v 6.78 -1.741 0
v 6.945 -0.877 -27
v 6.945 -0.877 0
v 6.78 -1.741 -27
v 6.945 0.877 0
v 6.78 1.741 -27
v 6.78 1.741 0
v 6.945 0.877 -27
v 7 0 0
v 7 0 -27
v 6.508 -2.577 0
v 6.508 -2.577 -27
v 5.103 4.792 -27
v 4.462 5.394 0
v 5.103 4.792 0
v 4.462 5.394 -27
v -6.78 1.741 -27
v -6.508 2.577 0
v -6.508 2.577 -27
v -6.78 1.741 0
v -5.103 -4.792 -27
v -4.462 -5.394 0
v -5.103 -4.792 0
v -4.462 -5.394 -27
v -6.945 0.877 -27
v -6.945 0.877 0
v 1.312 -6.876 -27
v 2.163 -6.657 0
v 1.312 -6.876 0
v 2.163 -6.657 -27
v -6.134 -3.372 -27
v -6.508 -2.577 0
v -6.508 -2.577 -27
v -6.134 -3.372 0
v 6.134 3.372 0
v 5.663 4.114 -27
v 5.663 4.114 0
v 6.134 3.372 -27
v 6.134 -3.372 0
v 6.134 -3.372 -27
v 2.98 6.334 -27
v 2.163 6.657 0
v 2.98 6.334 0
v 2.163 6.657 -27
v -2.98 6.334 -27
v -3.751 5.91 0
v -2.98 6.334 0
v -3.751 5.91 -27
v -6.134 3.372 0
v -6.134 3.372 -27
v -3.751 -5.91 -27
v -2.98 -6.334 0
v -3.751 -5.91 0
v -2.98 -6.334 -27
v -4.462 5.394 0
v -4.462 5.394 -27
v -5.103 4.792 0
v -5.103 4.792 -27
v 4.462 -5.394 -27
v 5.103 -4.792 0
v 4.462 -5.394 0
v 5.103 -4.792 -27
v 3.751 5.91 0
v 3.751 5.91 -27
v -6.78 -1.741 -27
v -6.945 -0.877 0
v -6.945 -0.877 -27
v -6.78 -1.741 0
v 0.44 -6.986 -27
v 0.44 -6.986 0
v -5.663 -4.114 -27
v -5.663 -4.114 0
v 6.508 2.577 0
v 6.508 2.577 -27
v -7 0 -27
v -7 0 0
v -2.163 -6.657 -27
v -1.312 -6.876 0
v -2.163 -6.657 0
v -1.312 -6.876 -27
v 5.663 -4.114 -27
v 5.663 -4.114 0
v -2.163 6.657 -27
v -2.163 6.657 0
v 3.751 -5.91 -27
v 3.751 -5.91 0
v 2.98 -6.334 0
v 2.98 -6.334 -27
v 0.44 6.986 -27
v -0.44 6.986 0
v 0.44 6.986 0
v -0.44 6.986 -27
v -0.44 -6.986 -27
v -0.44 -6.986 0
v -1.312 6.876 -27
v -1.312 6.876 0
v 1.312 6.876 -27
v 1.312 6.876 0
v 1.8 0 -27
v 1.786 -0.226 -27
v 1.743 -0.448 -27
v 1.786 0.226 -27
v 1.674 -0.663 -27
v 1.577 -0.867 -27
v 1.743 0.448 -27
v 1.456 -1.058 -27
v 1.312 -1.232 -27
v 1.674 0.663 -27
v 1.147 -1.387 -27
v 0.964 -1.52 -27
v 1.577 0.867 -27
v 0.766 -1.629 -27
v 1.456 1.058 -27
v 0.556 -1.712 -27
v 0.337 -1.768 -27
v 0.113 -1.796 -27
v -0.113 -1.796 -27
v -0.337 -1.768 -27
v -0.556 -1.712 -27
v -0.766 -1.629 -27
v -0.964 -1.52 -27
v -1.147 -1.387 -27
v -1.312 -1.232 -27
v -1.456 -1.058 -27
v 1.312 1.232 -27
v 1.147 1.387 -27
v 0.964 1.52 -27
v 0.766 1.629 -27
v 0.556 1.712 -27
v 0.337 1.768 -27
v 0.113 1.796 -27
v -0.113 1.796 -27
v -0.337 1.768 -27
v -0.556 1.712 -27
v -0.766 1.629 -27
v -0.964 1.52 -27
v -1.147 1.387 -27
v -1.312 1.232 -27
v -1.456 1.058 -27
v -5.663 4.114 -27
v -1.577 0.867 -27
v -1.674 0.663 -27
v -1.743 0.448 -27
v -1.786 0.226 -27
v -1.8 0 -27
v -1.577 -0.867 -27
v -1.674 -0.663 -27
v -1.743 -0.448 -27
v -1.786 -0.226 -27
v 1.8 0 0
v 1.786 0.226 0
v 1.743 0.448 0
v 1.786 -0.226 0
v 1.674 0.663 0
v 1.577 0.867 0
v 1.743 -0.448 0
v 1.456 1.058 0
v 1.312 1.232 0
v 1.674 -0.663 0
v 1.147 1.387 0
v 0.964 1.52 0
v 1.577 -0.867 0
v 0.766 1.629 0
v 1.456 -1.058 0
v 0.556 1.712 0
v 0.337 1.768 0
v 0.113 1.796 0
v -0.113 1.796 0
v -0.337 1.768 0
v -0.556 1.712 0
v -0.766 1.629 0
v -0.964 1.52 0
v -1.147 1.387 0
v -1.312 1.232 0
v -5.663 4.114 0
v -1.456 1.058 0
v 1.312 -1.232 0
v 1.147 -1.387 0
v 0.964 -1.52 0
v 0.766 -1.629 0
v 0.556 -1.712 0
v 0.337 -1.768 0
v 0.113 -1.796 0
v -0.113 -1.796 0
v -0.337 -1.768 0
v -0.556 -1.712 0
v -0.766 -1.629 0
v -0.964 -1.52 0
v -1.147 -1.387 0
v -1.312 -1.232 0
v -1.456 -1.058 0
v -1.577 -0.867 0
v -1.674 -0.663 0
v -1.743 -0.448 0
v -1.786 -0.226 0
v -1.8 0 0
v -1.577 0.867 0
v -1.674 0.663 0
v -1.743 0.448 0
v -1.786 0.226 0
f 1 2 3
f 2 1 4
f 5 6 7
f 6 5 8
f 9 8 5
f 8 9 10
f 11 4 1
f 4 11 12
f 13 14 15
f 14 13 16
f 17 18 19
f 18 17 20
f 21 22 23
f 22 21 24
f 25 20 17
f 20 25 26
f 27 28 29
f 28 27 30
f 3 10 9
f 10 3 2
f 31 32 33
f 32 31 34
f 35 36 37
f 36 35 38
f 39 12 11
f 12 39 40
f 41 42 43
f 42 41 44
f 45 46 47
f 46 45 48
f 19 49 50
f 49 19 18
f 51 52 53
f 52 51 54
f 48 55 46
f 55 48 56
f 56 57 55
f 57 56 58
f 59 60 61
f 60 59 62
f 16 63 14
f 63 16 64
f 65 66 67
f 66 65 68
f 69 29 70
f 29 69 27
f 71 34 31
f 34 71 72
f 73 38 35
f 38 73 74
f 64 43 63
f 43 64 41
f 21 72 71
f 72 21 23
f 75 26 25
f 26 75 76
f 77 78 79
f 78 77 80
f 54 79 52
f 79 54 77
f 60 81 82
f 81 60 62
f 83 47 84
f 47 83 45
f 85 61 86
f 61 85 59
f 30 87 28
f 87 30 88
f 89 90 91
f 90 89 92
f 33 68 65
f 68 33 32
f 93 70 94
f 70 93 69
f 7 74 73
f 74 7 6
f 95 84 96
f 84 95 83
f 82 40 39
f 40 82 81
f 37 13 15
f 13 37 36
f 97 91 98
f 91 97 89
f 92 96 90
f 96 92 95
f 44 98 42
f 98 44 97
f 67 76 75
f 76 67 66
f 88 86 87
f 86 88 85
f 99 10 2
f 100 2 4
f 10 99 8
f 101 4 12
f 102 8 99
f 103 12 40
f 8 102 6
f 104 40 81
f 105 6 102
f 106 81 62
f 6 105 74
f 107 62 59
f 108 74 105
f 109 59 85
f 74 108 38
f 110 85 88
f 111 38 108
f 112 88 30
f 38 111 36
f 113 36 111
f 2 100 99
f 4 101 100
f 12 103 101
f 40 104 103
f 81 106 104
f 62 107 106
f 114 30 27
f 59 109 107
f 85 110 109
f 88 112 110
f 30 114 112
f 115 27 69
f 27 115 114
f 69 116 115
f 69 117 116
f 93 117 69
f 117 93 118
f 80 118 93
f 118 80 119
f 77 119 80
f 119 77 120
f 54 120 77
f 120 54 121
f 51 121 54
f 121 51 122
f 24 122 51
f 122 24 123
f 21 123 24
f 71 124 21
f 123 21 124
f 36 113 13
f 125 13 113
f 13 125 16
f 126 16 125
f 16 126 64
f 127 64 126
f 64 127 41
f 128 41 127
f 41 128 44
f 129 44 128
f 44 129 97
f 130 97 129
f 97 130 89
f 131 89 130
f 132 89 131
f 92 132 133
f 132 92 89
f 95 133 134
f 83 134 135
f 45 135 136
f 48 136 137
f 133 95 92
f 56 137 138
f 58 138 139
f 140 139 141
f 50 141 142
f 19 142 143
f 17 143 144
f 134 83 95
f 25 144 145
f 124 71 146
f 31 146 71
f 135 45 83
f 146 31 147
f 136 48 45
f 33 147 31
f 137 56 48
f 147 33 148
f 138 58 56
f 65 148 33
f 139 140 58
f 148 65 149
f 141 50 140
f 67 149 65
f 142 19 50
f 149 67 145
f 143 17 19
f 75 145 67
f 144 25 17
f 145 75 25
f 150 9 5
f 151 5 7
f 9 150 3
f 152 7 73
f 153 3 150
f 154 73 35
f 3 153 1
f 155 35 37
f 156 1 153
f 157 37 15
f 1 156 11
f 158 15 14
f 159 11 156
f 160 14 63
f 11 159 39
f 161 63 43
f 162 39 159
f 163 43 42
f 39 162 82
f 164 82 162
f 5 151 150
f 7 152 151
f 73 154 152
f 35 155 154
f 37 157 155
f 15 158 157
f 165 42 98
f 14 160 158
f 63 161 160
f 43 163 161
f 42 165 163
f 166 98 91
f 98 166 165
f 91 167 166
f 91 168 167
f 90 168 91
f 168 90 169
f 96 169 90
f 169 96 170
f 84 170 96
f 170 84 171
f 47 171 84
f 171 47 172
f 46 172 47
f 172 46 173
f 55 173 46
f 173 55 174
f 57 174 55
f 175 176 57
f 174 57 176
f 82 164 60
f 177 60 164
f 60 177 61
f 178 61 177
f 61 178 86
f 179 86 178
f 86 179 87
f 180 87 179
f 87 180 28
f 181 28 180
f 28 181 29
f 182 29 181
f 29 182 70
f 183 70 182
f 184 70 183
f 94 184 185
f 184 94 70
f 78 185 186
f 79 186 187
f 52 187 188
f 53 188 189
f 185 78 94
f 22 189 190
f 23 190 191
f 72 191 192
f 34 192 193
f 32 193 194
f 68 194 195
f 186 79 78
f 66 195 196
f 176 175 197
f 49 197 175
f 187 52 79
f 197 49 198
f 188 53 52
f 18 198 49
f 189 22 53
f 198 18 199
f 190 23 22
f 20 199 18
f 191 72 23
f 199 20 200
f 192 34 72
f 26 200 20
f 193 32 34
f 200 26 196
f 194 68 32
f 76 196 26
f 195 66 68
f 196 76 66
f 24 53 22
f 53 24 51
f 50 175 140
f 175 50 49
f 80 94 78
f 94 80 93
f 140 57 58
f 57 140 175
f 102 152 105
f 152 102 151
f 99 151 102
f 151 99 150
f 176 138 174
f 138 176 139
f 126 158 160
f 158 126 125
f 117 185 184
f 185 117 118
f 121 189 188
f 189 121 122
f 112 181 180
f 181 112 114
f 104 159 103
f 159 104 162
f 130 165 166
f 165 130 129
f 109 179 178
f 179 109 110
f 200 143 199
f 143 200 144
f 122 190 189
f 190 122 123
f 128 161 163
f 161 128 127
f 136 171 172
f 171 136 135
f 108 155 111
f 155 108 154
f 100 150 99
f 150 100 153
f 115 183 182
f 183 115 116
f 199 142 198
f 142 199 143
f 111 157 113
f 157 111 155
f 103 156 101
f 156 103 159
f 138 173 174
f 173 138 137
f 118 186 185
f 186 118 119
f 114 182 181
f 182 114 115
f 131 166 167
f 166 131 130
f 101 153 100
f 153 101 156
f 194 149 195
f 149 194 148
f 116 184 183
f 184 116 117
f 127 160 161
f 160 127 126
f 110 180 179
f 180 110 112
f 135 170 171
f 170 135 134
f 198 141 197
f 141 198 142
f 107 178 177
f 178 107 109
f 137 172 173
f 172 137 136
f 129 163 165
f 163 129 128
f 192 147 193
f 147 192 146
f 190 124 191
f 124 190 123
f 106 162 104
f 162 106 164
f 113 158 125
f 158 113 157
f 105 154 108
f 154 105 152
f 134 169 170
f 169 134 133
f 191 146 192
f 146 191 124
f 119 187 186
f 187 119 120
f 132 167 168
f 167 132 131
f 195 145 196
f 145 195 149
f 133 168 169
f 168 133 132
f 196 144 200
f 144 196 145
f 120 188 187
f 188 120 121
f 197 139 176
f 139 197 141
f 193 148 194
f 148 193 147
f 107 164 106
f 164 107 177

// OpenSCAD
$fn = 50;


difference() {
	union() {
		translate(v = [0, 0, -27.0000000000]) {
			cylinder(h = 27, r = 7.0000000000);
		}
		cylinder(h = 0, r = 17.0000000000);
	}
	union() {
		#translate(v = [0, 0, -27]) {
			cylinder(h = 27, r = 1.8000000000);
		}
	}
}
